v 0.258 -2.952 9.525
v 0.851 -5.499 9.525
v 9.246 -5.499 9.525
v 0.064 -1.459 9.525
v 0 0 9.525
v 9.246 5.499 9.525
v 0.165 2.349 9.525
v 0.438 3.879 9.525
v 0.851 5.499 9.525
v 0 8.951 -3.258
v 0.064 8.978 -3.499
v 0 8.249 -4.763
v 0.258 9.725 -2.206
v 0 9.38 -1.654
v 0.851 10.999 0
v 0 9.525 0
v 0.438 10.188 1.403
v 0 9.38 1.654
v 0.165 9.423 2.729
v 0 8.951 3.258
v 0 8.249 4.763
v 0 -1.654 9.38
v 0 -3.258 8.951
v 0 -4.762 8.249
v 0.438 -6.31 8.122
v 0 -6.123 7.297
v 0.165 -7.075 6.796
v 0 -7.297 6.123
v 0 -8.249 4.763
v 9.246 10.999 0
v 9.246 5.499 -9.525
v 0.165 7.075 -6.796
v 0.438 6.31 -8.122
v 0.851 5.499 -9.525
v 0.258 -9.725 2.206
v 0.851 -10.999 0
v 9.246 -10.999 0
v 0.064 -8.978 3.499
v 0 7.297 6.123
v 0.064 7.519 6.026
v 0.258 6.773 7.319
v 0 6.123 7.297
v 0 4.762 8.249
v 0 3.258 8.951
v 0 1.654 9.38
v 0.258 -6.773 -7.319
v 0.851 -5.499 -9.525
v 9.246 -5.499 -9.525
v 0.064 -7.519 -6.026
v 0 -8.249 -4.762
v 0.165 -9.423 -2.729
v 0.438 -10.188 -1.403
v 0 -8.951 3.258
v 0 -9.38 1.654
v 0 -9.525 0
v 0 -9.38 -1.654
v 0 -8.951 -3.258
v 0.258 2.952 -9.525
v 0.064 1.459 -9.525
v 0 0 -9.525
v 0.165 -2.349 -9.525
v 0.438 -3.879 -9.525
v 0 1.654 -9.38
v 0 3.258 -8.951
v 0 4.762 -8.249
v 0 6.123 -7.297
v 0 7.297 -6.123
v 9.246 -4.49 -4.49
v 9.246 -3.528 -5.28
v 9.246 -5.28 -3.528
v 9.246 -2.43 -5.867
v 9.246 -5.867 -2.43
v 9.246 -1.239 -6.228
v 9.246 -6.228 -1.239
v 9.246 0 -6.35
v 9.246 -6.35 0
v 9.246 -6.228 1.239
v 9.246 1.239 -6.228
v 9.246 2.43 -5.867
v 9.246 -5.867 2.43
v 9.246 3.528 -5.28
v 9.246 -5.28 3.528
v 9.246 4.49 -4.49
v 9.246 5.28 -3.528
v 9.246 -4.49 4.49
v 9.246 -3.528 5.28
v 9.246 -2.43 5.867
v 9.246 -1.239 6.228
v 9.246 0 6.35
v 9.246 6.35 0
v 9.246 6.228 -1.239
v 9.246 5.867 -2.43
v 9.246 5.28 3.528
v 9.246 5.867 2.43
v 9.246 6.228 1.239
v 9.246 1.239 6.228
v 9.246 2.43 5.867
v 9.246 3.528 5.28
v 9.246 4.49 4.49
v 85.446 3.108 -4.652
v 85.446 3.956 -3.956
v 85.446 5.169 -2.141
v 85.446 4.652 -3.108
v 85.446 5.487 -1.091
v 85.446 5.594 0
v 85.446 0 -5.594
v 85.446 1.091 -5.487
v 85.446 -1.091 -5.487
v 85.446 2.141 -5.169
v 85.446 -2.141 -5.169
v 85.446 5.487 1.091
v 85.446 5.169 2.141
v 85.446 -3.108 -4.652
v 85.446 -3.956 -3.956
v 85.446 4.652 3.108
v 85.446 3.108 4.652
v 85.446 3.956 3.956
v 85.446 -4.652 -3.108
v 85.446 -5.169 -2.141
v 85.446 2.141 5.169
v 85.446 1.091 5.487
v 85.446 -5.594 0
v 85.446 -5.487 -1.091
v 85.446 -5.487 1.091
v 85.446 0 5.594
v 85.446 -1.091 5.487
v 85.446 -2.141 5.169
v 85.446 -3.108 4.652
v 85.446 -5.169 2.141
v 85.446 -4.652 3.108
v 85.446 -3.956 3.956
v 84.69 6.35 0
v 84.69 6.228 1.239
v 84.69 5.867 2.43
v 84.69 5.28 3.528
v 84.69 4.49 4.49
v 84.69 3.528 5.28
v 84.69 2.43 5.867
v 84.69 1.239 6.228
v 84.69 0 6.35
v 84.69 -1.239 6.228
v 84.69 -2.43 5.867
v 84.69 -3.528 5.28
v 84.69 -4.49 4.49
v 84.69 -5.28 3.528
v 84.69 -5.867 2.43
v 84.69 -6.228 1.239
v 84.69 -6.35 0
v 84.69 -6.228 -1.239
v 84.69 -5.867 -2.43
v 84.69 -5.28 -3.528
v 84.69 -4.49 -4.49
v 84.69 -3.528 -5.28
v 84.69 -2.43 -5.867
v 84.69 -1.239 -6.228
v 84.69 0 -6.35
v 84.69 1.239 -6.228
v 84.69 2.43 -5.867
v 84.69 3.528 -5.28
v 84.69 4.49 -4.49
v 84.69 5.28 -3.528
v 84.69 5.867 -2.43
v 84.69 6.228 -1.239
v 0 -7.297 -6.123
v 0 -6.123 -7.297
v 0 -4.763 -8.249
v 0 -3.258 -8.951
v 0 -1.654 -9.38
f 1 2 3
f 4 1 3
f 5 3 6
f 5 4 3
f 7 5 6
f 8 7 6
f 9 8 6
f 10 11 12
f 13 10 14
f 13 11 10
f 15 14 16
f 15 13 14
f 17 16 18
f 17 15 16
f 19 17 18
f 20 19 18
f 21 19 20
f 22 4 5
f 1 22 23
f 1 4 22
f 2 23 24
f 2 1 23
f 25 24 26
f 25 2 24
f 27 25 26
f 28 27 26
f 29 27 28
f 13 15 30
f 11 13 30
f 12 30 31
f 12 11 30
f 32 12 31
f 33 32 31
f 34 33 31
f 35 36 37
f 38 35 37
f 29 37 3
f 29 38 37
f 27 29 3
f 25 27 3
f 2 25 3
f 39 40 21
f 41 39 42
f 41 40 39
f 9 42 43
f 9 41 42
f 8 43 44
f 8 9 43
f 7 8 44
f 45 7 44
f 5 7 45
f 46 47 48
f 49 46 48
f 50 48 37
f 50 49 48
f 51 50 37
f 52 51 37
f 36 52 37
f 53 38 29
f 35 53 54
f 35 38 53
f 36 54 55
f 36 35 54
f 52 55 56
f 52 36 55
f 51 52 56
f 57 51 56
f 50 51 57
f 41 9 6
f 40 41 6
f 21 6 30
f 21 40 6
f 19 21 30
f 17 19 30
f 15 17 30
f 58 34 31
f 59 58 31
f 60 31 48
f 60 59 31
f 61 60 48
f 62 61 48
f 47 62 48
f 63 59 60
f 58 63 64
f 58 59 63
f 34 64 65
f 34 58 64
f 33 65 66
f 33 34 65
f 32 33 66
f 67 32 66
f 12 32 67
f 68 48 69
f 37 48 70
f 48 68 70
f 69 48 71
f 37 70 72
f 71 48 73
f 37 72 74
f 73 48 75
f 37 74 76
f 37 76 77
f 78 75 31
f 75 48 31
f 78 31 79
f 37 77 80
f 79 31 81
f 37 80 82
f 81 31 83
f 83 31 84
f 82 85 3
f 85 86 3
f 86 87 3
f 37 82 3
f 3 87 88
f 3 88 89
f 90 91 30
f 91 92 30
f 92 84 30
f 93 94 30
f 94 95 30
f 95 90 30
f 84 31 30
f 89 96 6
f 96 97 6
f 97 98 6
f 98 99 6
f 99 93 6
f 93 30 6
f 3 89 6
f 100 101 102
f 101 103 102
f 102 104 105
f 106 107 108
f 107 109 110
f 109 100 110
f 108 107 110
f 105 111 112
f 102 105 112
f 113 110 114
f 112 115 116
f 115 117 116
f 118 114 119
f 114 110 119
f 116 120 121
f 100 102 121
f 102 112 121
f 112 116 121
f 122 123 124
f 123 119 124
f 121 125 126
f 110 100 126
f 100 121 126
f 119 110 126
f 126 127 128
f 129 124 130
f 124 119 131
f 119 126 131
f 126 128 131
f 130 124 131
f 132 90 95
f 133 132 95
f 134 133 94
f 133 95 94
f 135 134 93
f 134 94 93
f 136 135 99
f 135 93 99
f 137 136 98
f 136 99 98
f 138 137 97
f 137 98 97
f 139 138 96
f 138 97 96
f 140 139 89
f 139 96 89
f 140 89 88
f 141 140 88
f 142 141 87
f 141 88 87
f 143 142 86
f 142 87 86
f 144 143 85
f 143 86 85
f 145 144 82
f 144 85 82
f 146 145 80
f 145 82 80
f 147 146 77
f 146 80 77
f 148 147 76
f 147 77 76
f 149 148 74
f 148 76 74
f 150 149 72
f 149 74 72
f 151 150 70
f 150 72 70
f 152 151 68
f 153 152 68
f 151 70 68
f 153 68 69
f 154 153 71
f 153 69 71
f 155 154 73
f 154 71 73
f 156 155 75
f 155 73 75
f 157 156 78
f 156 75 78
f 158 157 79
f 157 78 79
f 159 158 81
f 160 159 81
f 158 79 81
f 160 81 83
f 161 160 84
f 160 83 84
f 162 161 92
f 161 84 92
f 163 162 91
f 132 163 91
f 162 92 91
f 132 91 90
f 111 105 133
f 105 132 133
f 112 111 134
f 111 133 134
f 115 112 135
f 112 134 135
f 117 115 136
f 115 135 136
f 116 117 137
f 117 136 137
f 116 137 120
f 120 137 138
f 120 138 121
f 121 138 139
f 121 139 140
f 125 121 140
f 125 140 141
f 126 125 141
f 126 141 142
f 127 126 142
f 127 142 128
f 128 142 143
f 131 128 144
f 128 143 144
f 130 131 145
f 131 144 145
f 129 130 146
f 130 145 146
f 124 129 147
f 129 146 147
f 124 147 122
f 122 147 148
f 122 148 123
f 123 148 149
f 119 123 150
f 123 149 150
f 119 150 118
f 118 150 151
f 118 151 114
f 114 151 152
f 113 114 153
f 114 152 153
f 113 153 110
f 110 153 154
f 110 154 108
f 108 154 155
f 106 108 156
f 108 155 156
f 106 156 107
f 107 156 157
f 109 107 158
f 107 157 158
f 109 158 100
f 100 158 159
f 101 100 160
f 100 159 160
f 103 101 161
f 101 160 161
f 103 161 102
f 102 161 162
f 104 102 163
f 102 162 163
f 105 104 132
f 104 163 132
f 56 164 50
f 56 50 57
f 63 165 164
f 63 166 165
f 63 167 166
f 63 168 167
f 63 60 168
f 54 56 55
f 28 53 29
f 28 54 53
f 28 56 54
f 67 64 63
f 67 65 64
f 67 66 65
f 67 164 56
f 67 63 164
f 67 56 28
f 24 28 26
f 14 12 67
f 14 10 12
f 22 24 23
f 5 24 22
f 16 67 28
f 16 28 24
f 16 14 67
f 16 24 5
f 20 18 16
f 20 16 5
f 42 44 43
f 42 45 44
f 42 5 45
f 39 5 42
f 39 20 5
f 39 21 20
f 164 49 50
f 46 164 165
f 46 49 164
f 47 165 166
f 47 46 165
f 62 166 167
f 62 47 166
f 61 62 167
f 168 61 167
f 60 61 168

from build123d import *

# Parameters (mm, degrees)
BASEHEAD_DEPTH = 9.2456


with BuildPart() as part:
    # Sketch1 → BaseHead (new body)
    with BuildSketch(Plane(origin=(0, 0, 0), x_dir=(0, 0, -1), z_dir=(1, 0, 0))):
        Polygon((9.525, 5.499261314), (9.525, -5.499261314), (0, -10.998522628), (-9.525, -5.499261314), (-9.525, 5.499261314), (0, 10.998522628), align=None)
    extrude(amount=BASEHEAD_DEPTH)

    # BodySke → BaseBody (revolve)
    with BuildSketch(Plane.XY):
        Polygon((0, 0), (85.4456, 0), (85.4456, 5.59435), (84.68995, 6.35), (0, 6.35), align=None)
    revolve(axis=Axis((0, 0, 0), (1, 0, 0)))

    # Sketch3 → HeadChamfer (revolve, cut)
    with BuildSketch(Plane.XY):
        Polygon((0, 9.525), (4.516912895, 17.348522628), (4.516912895, 23.698522628), (-12.7, 23.698522628), (-12.7, 9.525), align=None)
    revolve(axis=Axis((0, 0, 0), (1, 0, 0)), mode=Mode.SUBTRACT)


solid = part.part
